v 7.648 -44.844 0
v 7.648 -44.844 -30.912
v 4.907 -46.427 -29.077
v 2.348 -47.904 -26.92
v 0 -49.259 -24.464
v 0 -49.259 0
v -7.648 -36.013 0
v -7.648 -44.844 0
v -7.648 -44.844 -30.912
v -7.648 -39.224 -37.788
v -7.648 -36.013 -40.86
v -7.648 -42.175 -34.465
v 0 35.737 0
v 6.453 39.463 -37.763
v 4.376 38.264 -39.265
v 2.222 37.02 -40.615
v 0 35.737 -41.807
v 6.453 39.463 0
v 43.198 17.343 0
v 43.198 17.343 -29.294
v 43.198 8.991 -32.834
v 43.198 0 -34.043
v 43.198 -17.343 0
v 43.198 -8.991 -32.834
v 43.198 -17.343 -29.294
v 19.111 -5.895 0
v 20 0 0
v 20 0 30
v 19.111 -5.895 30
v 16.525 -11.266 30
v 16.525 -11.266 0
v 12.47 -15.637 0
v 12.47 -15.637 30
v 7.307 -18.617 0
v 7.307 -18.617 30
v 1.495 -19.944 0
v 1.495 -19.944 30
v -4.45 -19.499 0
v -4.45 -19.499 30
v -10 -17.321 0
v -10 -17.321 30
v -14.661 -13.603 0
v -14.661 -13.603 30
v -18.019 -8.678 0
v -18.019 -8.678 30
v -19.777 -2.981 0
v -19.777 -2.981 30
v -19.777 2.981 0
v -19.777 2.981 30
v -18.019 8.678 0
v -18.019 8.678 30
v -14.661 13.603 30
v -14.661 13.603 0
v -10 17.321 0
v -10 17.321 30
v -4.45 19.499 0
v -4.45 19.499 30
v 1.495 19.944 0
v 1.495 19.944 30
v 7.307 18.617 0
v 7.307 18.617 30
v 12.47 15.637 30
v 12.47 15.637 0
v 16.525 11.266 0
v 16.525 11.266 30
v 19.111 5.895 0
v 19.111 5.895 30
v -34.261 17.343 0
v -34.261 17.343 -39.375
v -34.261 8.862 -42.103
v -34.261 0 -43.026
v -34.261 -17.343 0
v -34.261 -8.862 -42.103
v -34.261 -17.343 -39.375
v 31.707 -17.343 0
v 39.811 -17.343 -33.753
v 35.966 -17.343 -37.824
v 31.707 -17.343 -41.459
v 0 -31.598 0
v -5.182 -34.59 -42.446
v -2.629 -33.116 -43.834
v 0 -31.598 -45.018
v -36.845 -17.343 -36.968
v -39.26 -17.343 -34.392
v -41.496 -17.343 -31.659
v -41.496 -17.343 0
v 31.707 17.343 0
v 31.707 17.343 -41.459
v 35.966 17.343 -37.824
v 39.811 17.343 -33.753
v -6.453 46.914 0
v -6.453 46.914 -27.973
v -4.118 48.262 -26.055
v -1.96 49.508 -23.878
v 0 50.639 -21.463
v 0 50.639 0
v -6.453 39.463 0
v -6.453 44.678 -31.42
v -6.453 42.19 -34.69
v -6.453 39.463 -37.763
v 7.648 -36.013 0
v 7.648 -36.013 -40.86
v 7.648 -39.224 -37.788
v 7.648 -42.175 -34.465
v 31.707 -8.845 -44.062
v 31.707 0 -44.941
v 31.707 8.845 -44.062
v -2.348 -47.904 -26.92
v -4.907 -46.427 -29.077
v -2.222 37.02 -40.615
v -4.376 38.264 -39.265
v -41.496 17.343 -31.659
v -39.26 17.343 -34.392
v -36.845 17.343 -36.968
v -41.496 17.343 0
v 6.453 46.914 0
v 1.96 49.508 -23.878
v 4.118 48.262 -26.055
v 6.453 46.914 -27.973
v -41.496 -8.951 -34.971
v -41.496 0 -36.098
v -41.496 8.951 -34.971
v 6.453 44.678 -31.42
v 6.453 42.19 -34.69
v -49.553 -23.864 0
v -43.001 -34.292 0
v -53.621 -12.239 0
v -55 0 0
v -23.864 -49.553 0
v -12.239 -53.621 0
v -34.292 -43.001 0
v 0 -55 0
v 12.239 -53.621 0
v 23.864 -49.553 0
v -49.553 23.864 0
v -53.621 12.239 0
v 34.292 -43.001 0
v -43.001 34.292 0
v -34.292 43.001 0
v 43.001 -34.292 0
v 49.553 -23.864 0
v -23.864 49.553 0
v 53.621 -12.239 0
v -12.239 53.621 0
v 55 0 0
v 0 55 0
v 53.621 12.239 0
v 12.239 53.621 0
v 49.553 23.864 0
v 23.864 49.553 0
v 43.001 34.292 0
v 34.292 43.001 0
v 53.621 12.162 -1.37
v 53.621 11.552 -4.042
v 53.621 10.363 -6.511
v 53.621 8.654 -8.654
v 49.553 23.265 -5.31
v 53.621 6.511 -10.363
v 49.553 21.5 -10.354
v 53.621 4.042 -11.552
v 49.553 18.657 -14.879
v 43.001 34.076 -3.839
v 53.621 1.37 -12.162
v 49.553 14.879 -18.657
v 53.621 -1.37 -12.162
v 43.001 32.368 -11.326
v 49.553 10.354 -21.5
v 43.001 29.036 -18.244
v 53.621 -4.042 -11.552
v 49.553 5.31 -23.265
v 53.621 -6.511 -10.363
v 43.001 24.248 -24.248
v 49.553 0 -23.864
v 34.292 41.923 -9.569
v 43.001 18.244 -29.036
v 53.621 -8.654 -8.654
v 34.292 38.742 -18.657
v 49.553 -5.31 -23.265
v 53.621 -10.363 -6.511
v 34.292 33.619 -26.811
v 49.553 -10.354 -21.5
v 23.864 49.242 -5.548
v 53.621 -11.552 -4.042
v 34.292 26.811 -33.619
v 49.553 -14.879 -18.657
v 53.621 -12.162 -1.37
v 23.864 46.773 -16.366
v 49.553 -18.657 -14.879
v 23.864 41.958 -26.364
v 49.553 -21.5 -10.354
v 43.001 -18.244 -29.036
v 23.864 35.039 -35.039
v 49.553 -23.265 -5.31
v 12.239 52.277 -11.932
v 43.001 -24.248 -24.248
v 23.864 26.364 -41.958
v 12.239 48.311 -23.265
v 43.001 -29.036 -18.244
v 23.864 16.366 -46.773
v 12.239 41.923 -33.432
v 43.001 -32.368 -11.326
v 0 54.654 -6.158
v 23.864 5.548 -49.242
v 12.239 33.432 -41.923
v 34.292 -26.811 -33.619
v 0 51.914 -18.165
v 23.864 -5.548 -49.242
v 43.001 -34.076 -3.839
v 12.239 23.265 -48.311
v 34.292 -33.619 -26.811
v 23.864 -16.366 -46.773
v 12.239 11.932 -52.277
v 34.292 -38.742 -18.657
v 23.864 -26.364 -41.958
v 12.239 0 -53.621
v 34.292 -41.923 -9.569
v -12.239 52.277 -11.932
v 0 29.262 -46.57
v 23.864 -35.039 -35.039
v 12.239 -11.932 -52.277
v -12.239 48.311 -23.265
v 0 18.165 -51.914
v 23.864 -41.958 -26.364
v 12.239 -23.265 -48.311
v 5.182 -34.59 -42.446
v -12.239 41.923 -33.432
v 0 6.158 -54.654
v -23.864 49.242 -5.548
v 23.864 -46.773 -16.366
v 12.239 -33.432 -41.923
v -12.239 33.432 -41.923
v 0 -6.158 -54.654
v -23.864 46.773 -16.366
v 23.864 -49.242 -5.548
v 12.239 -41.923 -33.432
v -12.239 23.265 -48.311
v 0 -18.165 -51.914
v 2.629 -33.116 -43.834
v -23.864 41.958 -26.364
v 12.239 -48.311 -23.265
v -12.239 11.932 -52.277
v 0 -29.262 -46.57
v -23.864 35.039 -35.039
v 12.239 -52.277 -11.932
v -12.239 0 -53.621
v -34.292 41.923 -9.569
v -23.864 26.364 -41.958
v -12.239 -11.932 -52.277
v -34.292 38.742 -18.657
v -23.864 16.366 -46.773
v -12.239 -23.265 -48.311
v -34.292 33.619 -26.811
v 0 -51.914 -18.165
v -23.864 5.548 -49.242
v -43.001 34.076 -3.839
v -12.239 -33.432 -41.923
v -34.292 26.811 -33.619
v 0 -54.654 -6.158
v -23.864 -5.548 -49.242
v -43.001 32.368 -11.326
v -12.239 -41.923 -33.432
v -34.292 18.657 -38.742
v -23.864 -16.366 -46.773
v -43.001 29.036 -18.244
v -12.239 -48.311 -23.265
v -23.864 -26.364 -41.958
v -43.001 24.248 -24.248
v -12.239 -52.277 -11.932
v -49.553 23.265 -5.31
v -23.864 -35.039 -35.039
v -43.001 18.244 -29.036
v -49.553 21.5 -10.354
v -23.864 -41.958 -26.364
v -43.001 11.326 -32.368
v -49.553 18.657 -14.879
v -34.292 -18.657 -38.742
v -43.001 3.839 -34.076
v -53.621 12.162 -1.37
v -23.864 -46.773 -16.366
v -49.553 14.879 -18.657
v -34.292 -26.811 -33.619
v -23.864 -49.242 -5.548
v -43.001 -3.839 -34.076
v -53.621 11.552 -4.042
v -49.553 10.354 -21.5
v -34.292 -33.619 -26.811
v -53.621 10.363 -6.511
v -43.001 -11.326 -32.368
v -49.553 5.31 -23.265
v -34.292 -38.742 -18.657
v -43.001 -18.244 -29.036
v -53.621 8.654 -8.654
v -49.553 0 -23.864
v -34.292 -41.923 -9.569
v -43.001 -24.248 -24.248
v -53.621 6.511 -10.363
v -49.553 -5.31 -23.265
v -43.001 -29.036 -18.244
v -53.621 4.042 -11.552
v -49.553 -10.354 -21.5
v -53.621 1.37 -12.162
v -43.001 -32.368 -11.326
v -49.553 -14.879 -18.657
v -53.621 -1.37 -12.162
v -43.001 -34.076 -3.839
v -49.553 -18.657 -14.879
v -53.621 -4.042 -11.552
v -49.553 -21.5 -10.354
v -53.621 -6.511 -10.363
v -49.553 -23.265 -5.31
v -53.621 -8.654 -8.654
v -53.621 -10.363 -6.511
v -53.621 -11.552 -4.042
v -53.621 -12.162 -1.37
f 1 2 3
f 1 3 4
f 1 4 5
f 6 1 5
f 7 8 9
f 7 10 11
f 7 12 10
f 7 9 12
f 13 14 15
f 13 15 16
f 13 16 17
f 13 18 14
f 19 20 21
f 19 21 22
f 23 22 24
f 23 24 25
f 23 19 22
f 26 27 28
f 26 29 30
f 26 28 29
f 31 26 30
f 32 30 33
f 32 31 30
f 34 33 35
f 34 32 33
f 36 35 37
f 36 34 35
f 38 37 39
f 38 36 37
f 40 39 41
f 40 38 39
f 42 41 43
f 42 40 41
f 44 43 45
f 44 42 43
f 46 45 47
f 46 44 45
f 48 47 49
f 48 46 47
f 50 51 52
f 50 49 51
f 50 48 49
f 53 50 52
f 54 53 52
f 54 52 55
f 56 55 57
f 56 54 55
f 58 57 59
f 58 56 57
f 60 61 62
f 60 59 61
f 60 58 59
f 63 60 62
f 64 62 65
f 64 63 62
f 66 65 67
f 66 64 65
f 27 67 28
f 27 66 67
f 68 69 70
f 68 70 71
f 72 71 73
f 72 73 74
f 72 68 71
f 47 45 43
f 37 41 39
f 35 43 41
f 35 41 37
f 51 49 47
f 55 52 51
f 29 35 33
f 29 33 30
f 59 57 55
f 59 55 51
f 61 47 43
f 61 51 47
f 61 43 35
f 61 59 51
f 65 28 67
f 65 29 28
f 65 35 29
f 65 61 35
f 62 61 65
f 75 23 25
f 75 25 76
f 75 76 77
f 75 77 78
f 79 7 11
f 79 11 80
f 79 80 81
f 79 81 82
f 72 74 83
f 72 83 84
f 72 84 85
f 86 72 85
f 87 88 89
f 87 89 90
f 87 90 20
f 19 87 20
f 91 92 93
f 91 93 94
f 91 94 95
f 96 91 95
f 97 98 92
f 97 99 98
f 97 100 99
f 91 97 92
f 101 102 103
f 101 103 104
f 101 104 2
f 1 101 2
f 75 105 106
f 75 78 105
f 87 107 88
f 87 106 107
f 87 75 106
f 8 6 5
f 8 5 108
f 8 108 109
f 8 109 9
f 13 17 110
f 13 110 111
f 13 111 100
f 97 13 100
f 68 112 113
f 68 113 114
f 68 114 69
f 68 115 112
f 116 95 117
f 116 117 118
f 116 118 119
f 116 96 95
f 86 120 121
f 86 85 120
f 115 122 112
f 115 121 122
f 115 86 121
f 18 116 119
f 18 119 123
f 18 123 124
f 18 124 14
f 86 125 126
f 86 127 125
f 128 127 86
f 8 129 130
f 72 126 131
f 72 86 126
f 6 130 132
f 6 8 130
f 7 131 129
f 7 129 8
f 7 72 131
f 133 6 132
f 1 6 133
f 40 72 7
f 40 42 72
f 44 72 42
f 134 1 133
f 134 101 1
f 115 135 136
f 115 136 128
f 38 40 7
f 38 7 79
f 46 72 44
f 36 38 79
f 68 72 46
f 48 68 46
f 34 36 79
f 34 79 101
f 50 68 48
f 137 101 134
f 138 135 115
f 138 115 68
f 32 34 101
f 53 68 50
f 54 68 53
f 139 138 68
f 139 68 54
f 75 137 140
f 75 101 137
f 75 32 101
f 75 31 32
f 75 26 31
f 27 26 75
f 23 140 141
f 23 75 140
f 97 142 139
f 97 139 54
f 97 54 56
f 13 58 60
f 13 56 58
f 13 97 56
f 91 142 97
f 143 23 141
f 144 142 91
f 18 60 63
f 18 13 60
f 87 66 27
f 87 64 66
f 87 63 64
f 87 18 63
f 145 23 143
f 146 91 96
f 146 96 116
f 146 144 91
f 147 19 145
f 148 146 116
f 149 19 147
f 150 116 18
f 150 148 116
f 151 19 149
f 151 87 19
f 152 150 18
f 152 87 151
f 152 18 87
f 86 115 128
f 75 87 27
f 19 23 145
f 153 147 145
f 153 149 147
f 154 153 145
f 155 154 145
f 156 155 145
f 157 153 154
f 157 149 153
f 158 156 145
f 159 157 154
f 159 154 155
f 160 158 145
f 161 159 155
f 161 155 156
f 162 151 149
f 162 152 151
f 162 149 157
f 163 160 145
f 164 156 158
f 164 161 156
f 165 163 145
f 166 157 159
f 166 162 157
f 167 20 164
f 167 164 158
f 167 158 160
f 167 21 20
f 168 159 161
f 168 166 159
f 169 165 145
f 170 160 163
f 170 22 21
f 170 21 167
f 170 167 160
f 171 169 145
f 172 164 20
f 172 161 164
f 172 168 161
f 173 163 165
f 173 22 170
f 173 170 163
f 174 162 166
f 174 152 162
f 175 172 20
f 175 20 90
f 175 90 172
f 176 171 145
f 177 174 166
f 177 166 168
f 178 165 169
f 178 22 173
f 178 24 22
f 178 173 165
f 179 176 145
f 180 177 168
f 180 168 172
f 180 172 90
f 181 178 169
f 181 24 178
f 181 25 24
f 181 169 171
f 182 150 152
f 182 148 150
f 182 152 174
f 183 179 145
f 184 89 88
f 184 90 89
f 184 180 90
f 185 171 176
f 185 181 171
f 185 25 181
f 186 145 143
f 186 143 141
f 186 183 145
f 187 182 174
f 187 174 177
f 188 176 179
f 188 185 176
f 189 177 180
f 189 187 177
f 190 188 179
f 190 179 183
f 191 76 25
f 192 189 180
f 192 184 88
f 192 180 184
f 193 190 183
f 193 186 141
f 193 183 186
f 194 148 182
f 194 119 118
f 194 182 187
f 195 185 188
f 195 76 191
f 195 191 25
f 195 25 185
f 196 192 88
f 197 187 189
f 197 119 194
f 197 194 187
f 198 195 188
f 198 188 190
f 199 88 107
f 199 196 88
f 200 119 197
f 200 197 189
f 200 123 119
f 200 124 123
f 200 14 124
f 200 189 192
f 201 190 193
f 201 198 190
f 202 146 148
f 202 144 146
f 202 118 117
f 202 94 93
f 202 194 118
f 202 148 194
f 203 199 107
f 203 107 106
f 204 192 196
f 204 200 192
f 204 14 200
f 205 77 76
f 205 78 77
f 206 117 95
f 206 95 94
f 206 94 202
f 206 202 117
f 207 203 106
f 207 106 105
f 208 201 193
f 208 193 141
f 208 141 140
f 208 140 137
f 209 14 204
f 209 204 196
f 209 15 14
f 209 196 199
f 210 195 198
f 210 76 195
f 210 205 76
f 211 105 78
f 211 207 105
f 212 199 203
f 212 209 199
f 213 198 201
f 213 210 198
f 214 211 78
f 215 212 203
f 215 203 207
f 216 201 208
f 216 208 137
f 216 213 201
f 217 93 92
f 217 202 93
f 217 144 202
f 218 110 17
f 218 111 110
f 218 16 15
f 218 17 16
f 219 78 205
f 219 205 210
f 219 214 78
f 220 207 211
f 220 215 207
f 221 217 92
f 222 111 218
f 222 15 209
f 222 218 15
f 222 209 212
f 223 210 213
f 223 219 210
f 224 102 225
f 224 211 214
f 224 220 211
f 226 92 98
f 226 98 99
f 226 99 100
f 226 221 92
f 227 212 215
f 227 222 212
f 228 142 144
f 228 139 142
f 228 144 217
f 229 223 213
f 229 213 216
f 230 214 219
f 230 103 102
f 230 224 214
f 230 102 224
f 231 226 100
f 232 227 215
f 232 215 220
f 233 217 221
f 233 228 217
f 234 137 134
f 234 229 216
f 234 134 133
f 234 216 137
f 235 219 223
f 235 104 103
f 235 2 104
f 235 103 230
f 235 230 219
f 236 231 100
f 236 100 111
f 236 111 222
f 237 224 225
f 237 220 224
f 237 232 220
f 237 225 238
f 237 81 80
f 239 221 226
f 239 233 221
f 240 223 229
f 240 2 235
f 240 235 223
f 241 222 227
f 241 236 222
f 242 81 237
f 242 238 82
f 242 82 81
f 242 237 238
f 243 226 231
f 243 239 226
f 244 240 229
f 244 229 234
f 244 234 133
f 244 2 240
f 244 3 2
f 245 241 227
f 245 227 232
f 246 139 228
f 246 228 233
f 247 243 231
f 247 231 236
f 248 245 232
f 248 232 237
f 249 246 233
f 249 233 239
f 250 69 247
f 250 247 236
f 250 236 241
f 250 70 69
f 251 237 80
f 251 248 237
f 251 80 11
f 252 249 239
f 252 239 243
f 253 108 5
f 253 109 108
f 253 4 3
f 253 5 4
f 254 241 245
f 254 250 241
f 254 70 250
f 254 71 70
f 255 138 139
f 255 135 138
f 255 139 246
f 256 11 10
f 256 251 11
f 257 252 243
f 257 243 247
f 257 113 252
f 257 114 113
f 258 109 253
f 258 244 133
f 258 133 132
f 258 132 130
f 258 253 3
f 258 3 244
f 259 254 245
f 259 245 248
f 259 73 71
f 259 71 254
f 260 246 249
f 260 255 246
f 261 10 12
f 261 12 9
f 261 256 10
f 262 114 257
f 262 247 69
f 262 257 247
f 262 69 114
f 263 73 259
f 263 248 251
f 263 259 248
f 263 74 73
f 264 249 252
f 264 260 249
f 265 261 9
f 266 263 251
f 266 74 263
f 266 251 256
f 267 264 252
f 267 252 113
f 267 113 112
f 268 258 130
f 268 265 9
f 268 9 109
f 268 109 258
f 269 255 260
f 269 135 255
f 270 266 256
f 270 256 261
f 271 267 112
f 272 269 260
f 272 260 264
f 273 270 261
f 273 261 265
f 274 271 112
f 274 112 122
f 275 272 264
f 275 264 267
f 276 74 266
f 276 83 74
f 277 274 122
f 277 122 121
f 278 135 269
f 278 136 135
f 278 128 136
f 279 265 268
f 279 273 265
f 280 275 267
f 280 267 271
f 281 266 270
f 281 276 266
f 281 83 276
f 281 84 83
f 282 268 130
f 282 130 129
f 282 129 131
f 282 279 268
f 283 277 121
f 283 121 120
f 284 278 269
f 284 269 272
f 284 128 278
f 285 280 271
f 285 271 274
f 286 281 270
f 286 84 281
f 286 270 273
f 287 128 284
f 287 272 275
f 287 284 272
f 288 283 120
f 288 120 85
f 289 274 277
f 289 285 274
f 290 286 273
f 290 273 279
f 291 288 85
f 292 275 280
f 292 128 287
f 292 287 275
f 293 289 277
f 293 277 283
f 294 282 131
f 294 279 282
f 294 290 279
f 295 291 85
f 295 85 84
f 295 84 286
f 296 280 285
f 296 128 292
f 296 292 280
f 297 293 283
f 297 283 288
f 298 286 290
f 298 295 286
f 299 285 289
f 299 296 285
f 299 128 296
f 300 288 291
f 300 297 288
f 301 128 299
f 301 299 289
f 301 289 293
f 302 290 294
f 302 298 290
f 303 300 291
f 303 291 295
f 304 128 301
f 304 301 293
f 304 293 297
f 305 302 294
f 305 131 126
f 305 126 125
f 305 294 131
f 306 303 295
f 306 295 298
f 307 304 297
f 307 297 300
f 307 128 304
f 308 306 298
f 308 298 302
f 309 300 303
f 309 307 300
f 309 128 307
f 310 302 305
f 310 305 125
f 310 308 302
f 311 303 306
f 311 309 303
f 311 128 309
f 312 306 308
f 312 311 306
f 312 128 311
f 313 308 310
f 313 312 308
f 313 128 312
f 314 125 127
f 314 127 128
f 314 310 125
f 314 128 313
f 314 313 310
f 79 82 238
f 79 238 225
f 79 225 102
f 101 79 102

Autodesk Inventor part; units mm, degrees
ref_plane "YZ Plane" through (0, 0, 0) normal (1, 0, 0) x (0, 1, 0)
ref_plane "XZ Plane" through (0, 0, 0) normal (0, 1, 0) x (-1, 0, 0)
ref_plane "XY Plane" through (0, 0, 0) normal (0, 0, 1) x (1, 0, 0)
sketch "Sketch1" plane through (0, 0, 0) normal (0, 0, 1) x (1, 0, 0)
  arc A0 (55, 0) -> (-55, 0) centre (0, 0) ccw
  line L0 (-55, 0) -> (55, 0)
  dimension "d0" = 55
  dimension "d1" = 110
revolve "Revolution1" add sketch "Sketch1" angle 180 about axis through (-55, 0, 0) along (-1, 0, 0)
sketch "Sketch2" plane through (0, 0, 0) normal (0, 0, 1) x (1, 0, 0)
  circle A0 centre (0, 0) radius 20
  dimension "d9" = 40
sketch "Sketch3" plane through (0, 0, 0) normal (0, 0, 1) x (1, 0, 0)
  line L0 (-34.2608, -17.3432) -> (-41.496, -17.3432)
  line L1 (-41.496, -17.3432) -> (-41.496, 17.3432)
  line L2 (-41.496, 17.3432) -> (-34.2608, 17.3432)
  line L3 (-34.2608, 17.3432) -> (-34.2608, -17.3432)
  line L4 (-34.2608, -17.3432) -> (-41.496, 17.3432) construction
  line L5 (-41.496, -17.3432) -> (-34.2608, 17.3432) construction
  line L6 (43.1984, -17.3432) -> (31.7072, -17.3432)
  line L7 (31.7072, -17.3432) -> (31.7072, 17.3432)
  line L8 (31.7072, 17.3432) -> (43.1984, 17.3432)
  line L9 (43.1984, 17.3432) -> (43.1984, -17.3432)
  line L10 (43.1984, -17.3432) -> (31.7072, 17.3432) construction
  line L11 (31.7072, -17.3432) -> (43.1984, 17.3432) construction
  point P0 (0, 0)
  point P1 (-37.8784, 0)
  point P2 (37.4528, 0)
extrude "Extrusion1" cut sketch "Sketch3" against normal blind 55
sketch "Sketch4" plane through (0, 0, 0) normal (0, 0, 1) x (1, 0, 0)
  line L0 (0, 35.7372) -> (-6.4528, 39.4627)
  line L1 (-6.4528, 39.4627) -> (-6.4528, 46.9137)
  line L2 (-6.4528, 46.9137) -> (0, 50.6392)
  line L3 (0, 50.6392) -> (6.4528, 46.9137)
  line L4 (6.4528, 46.9137) -> (6.4528, 39.4627)
  line L5 (6.4528, 39.4627) -> (0, 35.7372)
  line L6 (0, -31.5978) -> (7.6477, -36.0132)
  line L7 (7.6477, -36.0132) -> (7.6477, -44.844)
  line L8 (7.6477, -44.844) -> (0, -49.2594)
  line L9 (0, -49.2594) -> (-7.6477, -44.844)
  line L10 (-7.6477, -44.844) -> (-7.6477, -36.0132)
  line L11 (-7.6477, -36.0132) -> (0, -31.5978)
  point P0 (0, 0)
  point P1 (0, 43.1882)
  point P2 (0, -40.4286)
extrude "Extrusion2" cut sketch "Sketch4" against normal blind 55
extrude "Extrusion4" add sketch "Sketch2" along normal blind 30
properties material "Aluminum 6061"
